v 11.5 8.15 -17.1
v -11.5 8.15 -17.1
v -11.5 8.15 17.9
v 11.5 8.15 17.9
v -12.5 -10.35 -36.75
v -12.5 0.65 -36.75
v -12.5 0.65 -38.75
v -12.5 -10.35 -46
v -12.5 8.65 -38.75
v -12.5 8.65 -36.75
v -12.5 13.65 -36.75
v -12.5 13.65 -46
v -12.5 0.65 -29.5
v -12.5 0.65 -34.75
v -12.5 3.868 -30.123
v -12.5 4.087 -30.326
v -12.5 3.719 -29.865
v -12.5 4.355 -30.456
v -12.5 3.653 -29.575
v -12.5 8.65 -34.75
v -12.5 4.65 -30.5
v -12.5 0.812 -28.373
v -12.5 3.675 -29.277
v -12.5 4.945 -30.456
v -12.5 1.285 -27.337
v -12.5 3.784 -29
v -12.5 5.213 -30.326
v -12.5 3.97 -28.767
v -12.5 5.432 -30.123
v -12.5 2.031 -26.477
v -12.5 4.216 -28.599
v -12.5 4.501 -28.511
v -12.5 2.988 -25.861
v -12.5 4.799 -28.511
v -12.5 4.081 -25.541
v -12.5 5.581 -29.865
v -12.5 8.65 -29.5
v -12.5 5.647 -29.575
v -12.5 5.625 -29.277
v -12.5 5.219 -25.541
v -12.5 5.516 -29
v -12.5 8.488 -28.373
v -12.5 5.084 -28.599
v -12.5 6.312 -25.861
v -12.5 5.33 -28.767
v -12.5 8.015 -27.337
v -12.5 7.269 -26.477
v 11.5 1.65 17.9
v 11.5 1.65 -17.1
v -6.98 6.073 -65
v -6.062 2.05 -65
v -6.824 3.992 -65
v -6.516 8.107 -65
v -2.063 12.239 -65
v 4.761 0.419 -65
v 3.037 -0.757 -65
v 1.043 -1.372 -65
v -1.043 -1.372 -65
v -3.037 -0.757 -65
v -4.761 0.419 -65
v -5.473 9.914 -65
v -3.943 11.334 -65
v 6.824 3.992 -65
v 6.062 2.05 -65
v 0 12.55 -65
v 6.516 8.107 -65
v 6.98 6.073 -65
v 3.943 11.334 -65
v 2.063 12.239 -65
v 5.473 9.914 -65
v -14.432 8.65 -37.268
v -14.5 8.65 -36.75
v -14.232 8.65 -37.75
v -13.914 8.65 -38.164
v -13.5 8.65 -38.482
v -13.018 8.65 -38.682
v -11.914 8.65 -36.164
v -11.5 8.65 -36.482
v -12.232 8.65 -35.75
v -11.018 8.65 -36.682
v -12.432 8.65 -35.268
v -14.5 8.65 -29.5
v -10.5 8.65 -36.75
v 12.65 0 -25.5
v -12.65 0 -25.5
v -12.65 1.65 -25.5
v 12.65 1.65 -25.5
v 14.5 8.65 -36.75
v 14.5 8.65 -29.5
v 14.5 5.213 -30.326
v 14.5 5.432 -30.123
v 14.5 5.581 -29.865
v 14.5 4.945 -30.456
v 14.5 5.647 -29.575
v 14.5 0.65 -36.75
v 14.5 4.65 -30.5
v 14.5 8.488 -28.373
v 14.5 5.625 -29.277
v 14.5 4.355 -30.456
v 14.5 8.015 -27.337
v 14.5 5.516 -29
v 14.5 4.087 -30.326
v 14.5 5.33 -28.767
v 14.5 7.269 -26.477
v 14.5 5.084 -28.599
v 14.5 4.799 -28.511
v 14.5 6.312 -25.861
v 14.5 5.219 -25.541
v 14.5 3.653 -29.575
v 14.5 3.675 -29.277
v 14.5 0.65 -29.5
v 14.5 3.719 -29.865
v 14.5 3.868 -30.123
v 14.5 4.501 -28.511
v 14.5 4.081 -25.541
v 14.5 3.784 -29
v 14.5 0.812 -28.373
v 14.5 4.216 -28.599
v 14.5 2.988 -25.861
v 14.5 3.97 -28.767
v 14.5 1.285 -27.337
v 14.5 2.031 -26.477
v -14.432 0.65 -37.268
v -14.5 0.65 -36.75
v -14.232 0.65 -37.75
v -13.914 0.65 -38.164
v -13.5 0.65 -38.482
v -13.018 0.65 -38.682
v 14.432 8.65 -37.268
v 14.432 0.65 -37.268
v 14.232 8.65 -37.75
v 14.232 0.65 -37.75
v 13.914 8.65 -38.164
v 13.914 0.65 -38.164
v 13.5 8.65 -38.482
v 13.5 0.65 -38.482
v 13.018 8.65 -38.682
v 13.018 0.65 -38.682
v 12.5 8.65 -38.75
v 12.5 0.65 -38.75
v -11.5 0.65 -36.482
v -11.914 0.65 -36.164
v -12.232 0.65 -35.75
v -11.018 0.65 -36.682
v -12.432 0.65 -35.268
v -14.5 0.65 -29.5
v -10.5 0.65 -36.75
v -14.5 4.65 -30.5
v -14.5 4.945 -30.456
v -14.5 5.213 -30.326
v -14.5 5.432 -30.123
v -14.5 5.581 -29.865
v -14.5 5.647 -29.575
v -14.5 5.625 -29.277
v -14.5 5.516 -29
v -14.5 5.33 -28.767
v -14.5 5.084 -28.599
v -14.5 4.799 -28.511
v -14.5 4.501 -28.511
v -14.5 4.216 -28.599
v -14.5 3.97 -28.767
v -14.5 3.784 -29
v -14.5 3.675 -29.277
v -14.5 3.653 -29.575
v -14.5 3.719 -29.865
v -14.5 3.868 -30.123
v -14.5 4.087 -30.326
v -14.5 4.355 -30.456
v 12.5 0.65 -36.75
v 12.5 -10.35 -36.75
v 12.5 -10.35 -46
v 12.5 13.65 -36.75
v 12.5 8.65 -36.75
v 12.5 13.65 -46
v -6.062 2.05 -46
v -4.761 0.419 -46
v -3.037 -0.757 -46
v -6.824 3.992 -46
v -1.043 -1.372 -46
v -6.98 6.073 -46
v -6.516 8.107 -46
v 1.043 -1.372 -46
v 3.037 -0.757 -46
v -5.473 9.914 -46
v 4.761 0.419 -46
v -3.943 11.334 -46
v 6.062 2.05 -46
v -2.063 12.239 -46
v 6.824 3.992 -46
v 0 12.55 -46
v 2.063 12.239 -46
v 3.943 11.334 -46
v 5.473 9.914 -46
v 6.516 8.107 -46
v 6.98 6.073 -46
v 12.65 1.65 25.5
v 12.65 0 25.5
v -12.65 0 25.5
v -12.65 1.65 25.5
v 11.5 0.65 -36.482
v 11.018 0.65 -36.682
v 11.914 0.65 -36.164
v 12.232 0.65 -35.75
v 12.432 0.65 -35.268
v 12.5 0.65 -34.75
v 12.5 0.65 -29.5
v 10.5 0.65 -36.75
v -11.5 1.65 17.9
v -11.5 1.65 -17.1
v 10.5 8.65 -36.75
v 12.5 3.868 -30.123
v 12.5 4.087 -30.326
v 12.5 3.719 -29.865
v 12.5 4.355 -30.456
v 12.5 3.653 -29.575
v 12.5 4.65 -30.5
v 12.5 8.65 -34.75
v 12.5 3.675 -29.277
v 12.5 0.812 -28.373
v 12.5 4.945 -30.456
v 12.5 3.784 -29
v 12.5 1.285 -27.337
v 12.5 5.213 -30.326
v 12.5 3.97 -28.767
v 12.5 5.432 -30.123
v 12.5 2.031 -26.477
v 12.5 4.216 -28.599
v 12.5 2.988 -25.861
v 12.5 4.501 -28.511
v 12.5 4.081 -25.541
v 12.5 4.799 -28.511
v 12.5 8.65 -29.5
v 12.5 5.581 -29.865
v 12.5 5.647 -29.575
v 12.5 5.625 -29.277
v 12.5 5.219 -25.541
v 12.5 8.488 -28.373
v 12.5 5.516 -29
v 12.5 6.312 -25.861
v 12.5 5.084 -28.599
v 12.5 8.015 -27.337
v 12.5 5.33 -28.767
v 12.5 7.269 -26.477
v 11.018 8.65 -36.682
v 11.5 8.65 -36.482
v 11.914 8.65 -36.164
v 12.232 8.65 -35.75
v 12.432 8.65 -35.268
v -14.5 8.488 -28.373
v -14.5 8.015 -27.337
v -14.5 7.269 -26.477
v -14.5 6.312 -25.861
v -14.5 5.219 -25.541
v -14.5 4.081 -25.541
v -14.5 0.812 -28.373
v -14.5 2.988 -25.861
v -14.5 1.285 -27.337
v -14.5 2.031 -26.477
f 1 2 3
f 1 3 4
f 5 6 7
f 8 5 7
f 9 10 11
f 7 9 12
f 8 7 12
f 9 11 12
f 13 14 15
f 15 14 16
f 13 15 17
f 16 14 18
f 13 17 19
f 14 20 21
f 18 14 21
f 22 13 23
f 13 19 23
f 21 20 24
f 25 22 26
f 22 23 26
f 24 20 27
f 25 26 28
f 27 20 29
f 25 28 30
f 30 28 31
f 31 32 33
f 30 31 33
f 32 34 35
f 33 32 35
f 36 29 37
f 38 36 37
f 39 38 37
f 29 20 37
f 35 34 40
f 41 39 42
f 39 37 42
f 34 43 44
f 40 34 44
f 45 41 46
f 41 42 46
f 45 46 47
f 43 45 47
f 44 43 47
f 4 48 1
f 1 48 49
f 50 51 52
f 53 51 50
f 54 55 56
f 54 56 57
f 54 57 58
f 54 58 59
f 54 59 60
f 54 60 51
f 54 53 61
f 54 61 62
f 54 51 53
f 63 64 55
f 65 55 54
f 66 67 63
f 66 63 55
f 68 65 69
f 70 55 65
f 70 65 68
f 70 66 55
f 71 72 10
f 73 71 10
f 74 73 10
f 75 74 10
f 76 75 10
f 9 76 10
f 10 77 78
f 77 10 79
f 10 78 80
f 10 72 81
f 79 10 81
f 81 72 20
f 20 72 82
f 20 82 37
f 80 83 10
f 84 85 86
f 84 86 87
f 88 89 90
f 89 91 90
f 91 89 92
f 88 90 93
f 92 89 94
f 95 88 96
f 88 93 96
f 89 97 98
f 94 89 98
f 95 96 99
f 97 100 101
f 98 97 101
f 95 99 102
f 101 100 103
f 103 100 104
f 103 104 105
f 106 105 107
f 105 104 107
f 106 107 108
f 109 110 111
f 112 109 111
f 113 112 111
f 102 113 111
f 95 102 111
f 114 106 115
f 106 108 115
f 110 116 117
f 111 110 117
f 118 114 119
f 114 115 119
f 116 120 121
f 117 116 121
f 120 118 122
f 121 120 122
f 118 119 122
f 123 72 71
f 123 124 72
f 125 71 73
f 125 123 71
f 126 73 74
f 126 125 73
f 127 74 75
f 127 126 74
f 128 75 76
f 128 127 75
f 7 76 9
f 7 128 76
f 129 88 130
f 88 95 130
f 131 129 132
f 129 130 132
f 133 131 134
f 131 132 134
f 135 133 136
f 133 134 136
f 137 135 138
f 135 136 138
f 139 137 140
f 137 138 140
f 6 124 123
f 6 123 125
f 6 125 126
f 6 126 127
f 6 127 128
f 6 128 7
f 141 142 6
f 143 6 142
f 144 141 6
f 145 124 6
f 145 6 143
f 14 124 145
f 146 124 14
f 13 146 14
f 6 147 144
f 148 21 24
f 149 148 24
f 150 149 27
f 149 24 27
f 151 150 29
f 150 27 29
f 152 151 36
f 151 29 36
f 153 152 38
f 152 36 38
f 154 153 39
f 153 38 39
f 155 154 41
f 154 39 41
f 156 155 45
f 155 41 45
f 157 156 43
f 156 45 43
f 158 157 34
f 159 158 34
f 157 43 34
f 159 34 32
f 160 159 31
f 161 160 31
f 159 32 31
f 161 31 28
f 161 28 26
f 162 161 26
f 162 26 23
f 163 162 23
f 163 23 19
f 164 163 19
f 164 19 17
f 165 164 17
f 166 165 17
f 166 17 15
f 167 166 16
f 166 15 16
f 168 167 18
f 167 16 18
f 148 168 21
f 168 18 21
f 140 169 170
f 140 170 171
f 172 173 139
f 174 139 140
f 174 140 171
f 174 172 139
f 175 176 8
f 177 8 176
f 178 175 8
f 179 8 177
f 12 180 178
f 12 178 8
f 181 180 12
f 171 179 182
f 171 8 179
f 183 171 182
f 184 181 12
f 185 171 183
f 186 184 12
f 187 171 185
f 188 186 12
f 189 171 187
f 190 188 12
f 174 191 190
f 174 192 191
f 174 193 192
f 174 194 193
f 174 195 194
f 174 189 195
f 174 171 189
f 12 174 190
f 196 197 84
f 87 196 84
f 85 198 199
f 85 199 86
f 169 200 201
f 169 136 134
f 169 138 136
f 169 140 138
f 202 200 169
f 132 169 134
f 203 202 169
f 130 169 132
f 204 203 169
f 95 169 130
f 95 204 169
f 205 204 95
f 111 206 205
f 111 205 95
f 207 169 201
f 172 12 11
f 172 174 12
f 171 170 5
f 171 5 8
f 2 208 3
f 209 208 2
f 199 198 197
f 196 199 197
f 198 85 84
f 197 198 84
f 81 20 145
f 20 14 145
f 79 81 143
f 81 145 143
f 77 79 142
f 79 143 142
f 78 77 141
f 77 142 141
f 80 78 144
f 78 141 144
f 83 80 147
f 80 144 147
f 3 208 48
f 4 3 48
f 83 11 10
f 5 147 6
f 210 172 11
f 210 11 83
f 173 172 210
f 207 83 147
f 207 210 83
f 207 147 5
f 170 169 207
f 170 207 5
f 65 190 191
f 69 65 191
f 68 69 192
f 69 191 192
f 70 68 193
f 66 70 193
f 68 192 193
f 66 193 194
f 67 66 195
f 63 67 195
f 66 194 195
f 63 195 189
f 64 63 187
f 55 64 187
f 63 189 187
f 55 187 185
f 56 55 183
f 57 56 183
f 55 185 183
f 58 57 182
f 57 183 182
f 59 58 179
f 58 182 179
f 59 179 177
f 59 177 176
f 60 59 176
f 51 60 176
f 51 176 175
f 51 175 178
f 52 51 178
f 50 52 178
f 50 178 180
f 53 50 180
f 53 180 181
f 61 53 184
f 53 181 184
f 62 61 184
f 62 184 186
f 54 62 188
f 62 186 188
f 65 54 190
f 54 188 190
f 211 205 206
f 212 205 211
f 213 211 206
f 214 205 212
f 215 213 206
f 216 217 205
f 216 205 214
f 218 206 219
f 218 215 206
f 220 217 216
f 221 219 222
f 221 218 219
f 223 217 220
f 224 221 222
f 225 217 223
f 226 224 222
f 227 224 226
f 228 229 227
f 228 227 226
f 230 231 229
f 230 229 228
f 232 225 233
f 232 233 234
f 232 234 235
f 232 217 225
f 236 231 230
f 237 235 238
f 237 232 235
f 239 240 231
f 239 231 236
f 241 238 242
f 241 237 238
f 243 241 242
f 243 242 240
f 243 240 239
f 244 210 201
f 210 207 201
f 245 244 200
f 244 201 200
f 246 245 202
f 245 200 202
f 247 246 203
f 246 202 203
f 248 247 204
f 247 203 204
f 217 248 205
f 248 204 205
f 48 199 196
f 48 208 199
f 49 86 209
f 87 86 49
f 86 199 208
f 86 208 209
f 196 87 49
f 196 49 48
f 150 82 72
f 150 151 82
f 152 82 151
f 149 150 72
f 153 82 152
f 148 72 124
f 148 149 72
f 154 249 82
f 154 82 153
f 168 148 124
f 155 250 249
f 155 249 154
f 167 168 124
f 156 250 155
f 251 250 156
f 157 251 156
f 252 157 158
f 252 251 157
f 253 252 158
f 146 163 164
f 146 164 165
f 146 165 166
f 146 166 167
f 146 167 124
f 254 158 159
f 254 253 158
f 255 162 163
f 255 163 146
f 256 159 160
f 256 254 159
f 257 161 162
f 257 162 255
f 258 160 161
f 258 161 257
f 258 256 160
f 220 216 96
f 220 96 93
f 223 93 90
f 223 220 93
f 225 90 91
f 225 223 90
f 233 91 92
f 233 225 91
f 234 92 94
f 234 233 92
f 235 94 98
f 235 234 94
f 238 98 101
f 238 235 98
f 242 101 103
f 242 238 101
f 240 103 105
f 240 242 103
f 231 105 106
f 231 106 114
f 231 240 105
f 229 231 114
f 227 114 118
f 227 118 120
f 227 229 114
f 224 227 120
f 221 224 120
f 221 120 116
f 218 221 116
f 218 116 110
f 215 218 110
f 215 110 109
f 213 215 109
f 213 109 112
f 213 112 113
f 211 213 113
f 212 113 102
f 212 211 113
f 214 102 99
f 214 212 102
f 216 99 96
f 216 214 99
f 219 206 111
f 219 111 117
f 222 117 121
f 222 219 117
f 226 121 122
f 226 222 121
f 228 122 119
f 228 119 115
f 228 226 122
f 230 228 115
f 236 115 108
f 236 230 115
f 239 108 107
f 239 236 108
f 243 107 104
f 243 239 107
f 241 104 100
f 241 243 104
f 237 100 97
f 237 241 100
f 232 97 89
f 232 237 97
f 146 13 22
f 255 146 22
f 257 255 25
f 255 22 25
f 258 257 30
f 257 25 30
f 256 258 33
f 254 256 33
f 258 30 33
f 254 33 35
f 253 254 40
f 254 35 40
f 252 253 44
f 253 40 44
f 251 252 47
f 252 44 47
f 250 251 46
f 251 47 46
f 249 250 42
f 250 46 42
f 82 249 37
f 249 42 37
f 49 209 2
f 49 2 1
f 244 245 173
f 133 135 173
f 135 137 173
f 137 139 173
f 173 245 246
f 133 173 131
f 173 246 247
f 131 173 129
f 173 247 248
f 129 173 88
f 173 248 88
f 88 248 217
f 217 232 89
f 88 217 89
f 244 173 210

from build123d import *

# Parameters (mm, degrees)
SKETCH1_W           = 25.3
SKETCH1_H           = 51
BOSS_EXTRUDE1_DEPTH = 1.65
SKETCH2_W           = 23
SKETCH2_H           = 35
BOSS_EXTRUDE2_DEPTH = 6.5
BOSS_EXTRUDE3_DEPTH = 12.5
BOSS_EXTRUDE4_START = 12.5
SKETCH3_3_R         = 1
BOSS_EXTRUDE4_DEPTH = 2
BOSS_EXTRUDE5_START = -12.5
SKETCH3_4_R         = 1
BOSS_EXTRUDE5_DEPTH = 2
SKETCH5_W           = 29
SKETCH5_H           = 8
BOSS_EXTRUDE6_DEPTH = 2
FILLET1_R           = 2
SKETCH6_R           = 7
BOSS_EXTRUDE7_DEPTH = 19


with BuildPart() as part:
    # Sketch1 → Boss-Extrude1 (new body)
    with BuildSketch(Plane(origin=(0, 0, 0), x_dir=(1, 0, 0), z_dir=(0, 1, 0))):
        Rectangle(SKETCH1_W, SKETCH1_H)
    extrude(amount=BOSS_EXTRUDE1_DEPTH)

    # Sketch2 → Boss-Extrude2 (add)
    with BuildSketch(Plane(origin=(0, 1.65, 0), x_dir=(1, 0, 0), z_dir=(0, 1, 0))):
        with Locations((0, -0.4)):
            Rectangle(SKETCH2_W, SKETCH2_H)
    extrude(amount=BOSS_EXTRUDE2_DEPTH)


with BuildPart() as body_2:
    # Sketch3 → Boss-Extrude3 (new, symmetric)
    with BuildSketch(Plane(origin=(0, 0, 0), x_dir=(0, 0, -1), z_dir=(1, 0, 0))):
        Polygon((36.75, 13.65), (36.75, 8.65), (36.75, 0.65), (36.75, -10.35), (46, -10.35), (46, 13.65), align=None)
    extrude(amount=BOSS_EXTRUDE3_DEPTH, both=True)



with BuildPart() as body_3:
    # Sketch3<3> → Boss-Extrude4 (new body)
    with BuildSketch(Plane(origin=(0, 0, 0), x_dir=(0, 0, -1), z_dir=(1, 0, 0)).offset(BOSS_EXTRUDE4_START)):
        with BuildLine():
            Line((29.5, 8.65), (36.75, 8.65))
            Line((36.75, 8.65), (36.75, 0.65))
            Line((36.75, 0.65), (29.5, 0.65))
            ThreePointArc((29.5, 0.65), (25.5, 4.65), (29.5, 8.65))
        make_face()
        with Locations((29.5, 4.65)):
            Circle(SKETCH3_3_R, mode=Mode.SUBTRACT)
    extrude(amount=BOSS_EXTRUDE4_DEPTH)


with BuildPart() as body_4:
    # Sketch3<4> → Boss-Extrude5 (new body)
    with BuildSketch(Plane(origin=(0, 0, 0), x_dir=(0, 0, -1), z_dir=(1, 0, 0)).offset(BOSS_EXTRUDE5_START)):
        with BuildLine():
            Line((29.5, 8.65), (36.75, 8.65))
            Line((36.75, 8.65), (36.75, 0.65))
            Line((36.75, 0.65), (29.5, 0.65))
            ThreePointArc((29.5, 0.65), (25.5, 4.65), (29.5, 8.65))
        make_face()
        with Locations((29.5, 4.65)):
            Circle(SKETCH3_4_R, mode=Mode.SUBTRACT)
    extrude(amount=-BOSS_EXTRUDE5_DEPTH)


with BuildPart() as body_2_1:
    add(body_2.part)

    add(body_3.part)  # Boss-Extrude6 merges body 3

    add(body_4.part)  # Boss-Extrude6 merges body 4
    # Sketch5 → Boss-Extrude6 (add)
    with BuildSketch(Plane(origin=(0, 0, -36.75), x_dir=(1, 0, 0), z_dir=(0, 0, -1))):
        with Locations((0, -4.65)):
            Rectangle(SKETCH5_W, SKETCH5_H)
    extrude(amount=BOSS_EXTRUDE6_DEPTH)

    # Fillet1
    fillet1_edges = [body_2_1.edges().sort_by_distance(p)[0] for p in [
        (12.5, 4.65, -36.75),
        (-12.5, 4.65, -36.75),
    ]]
    fillet(fillet1_edges, radius=FILLET1_R)
    fillet1_2_edges = [body_2_1.edges().sort_by_distance(p)[0] for p in [
        (14.5, 4.65, -38.75),
        (-14.5, 4.65, -38.75),
    ]]
    fillet(fillet1_2_edges, radius=FILLET1_R - 0.0001)  # a hair under: the kernel refuses the full size

    # Sketch6 → Boss-Extrude7 (add)
    with BuildSketch(Plane(origin=(0, 0, -46), x_dir=(1, 0, 0), z_dir=(0, 0, -1))):
        with Locations(Location((0, -5.55, 0), (0, 0, 270))):
            Circle(SKETCH6_R)
    extrude(amount=BOSS_EXTRUDE7_DEPTH)


solid = Compound([part.part, body_2_1.part])
